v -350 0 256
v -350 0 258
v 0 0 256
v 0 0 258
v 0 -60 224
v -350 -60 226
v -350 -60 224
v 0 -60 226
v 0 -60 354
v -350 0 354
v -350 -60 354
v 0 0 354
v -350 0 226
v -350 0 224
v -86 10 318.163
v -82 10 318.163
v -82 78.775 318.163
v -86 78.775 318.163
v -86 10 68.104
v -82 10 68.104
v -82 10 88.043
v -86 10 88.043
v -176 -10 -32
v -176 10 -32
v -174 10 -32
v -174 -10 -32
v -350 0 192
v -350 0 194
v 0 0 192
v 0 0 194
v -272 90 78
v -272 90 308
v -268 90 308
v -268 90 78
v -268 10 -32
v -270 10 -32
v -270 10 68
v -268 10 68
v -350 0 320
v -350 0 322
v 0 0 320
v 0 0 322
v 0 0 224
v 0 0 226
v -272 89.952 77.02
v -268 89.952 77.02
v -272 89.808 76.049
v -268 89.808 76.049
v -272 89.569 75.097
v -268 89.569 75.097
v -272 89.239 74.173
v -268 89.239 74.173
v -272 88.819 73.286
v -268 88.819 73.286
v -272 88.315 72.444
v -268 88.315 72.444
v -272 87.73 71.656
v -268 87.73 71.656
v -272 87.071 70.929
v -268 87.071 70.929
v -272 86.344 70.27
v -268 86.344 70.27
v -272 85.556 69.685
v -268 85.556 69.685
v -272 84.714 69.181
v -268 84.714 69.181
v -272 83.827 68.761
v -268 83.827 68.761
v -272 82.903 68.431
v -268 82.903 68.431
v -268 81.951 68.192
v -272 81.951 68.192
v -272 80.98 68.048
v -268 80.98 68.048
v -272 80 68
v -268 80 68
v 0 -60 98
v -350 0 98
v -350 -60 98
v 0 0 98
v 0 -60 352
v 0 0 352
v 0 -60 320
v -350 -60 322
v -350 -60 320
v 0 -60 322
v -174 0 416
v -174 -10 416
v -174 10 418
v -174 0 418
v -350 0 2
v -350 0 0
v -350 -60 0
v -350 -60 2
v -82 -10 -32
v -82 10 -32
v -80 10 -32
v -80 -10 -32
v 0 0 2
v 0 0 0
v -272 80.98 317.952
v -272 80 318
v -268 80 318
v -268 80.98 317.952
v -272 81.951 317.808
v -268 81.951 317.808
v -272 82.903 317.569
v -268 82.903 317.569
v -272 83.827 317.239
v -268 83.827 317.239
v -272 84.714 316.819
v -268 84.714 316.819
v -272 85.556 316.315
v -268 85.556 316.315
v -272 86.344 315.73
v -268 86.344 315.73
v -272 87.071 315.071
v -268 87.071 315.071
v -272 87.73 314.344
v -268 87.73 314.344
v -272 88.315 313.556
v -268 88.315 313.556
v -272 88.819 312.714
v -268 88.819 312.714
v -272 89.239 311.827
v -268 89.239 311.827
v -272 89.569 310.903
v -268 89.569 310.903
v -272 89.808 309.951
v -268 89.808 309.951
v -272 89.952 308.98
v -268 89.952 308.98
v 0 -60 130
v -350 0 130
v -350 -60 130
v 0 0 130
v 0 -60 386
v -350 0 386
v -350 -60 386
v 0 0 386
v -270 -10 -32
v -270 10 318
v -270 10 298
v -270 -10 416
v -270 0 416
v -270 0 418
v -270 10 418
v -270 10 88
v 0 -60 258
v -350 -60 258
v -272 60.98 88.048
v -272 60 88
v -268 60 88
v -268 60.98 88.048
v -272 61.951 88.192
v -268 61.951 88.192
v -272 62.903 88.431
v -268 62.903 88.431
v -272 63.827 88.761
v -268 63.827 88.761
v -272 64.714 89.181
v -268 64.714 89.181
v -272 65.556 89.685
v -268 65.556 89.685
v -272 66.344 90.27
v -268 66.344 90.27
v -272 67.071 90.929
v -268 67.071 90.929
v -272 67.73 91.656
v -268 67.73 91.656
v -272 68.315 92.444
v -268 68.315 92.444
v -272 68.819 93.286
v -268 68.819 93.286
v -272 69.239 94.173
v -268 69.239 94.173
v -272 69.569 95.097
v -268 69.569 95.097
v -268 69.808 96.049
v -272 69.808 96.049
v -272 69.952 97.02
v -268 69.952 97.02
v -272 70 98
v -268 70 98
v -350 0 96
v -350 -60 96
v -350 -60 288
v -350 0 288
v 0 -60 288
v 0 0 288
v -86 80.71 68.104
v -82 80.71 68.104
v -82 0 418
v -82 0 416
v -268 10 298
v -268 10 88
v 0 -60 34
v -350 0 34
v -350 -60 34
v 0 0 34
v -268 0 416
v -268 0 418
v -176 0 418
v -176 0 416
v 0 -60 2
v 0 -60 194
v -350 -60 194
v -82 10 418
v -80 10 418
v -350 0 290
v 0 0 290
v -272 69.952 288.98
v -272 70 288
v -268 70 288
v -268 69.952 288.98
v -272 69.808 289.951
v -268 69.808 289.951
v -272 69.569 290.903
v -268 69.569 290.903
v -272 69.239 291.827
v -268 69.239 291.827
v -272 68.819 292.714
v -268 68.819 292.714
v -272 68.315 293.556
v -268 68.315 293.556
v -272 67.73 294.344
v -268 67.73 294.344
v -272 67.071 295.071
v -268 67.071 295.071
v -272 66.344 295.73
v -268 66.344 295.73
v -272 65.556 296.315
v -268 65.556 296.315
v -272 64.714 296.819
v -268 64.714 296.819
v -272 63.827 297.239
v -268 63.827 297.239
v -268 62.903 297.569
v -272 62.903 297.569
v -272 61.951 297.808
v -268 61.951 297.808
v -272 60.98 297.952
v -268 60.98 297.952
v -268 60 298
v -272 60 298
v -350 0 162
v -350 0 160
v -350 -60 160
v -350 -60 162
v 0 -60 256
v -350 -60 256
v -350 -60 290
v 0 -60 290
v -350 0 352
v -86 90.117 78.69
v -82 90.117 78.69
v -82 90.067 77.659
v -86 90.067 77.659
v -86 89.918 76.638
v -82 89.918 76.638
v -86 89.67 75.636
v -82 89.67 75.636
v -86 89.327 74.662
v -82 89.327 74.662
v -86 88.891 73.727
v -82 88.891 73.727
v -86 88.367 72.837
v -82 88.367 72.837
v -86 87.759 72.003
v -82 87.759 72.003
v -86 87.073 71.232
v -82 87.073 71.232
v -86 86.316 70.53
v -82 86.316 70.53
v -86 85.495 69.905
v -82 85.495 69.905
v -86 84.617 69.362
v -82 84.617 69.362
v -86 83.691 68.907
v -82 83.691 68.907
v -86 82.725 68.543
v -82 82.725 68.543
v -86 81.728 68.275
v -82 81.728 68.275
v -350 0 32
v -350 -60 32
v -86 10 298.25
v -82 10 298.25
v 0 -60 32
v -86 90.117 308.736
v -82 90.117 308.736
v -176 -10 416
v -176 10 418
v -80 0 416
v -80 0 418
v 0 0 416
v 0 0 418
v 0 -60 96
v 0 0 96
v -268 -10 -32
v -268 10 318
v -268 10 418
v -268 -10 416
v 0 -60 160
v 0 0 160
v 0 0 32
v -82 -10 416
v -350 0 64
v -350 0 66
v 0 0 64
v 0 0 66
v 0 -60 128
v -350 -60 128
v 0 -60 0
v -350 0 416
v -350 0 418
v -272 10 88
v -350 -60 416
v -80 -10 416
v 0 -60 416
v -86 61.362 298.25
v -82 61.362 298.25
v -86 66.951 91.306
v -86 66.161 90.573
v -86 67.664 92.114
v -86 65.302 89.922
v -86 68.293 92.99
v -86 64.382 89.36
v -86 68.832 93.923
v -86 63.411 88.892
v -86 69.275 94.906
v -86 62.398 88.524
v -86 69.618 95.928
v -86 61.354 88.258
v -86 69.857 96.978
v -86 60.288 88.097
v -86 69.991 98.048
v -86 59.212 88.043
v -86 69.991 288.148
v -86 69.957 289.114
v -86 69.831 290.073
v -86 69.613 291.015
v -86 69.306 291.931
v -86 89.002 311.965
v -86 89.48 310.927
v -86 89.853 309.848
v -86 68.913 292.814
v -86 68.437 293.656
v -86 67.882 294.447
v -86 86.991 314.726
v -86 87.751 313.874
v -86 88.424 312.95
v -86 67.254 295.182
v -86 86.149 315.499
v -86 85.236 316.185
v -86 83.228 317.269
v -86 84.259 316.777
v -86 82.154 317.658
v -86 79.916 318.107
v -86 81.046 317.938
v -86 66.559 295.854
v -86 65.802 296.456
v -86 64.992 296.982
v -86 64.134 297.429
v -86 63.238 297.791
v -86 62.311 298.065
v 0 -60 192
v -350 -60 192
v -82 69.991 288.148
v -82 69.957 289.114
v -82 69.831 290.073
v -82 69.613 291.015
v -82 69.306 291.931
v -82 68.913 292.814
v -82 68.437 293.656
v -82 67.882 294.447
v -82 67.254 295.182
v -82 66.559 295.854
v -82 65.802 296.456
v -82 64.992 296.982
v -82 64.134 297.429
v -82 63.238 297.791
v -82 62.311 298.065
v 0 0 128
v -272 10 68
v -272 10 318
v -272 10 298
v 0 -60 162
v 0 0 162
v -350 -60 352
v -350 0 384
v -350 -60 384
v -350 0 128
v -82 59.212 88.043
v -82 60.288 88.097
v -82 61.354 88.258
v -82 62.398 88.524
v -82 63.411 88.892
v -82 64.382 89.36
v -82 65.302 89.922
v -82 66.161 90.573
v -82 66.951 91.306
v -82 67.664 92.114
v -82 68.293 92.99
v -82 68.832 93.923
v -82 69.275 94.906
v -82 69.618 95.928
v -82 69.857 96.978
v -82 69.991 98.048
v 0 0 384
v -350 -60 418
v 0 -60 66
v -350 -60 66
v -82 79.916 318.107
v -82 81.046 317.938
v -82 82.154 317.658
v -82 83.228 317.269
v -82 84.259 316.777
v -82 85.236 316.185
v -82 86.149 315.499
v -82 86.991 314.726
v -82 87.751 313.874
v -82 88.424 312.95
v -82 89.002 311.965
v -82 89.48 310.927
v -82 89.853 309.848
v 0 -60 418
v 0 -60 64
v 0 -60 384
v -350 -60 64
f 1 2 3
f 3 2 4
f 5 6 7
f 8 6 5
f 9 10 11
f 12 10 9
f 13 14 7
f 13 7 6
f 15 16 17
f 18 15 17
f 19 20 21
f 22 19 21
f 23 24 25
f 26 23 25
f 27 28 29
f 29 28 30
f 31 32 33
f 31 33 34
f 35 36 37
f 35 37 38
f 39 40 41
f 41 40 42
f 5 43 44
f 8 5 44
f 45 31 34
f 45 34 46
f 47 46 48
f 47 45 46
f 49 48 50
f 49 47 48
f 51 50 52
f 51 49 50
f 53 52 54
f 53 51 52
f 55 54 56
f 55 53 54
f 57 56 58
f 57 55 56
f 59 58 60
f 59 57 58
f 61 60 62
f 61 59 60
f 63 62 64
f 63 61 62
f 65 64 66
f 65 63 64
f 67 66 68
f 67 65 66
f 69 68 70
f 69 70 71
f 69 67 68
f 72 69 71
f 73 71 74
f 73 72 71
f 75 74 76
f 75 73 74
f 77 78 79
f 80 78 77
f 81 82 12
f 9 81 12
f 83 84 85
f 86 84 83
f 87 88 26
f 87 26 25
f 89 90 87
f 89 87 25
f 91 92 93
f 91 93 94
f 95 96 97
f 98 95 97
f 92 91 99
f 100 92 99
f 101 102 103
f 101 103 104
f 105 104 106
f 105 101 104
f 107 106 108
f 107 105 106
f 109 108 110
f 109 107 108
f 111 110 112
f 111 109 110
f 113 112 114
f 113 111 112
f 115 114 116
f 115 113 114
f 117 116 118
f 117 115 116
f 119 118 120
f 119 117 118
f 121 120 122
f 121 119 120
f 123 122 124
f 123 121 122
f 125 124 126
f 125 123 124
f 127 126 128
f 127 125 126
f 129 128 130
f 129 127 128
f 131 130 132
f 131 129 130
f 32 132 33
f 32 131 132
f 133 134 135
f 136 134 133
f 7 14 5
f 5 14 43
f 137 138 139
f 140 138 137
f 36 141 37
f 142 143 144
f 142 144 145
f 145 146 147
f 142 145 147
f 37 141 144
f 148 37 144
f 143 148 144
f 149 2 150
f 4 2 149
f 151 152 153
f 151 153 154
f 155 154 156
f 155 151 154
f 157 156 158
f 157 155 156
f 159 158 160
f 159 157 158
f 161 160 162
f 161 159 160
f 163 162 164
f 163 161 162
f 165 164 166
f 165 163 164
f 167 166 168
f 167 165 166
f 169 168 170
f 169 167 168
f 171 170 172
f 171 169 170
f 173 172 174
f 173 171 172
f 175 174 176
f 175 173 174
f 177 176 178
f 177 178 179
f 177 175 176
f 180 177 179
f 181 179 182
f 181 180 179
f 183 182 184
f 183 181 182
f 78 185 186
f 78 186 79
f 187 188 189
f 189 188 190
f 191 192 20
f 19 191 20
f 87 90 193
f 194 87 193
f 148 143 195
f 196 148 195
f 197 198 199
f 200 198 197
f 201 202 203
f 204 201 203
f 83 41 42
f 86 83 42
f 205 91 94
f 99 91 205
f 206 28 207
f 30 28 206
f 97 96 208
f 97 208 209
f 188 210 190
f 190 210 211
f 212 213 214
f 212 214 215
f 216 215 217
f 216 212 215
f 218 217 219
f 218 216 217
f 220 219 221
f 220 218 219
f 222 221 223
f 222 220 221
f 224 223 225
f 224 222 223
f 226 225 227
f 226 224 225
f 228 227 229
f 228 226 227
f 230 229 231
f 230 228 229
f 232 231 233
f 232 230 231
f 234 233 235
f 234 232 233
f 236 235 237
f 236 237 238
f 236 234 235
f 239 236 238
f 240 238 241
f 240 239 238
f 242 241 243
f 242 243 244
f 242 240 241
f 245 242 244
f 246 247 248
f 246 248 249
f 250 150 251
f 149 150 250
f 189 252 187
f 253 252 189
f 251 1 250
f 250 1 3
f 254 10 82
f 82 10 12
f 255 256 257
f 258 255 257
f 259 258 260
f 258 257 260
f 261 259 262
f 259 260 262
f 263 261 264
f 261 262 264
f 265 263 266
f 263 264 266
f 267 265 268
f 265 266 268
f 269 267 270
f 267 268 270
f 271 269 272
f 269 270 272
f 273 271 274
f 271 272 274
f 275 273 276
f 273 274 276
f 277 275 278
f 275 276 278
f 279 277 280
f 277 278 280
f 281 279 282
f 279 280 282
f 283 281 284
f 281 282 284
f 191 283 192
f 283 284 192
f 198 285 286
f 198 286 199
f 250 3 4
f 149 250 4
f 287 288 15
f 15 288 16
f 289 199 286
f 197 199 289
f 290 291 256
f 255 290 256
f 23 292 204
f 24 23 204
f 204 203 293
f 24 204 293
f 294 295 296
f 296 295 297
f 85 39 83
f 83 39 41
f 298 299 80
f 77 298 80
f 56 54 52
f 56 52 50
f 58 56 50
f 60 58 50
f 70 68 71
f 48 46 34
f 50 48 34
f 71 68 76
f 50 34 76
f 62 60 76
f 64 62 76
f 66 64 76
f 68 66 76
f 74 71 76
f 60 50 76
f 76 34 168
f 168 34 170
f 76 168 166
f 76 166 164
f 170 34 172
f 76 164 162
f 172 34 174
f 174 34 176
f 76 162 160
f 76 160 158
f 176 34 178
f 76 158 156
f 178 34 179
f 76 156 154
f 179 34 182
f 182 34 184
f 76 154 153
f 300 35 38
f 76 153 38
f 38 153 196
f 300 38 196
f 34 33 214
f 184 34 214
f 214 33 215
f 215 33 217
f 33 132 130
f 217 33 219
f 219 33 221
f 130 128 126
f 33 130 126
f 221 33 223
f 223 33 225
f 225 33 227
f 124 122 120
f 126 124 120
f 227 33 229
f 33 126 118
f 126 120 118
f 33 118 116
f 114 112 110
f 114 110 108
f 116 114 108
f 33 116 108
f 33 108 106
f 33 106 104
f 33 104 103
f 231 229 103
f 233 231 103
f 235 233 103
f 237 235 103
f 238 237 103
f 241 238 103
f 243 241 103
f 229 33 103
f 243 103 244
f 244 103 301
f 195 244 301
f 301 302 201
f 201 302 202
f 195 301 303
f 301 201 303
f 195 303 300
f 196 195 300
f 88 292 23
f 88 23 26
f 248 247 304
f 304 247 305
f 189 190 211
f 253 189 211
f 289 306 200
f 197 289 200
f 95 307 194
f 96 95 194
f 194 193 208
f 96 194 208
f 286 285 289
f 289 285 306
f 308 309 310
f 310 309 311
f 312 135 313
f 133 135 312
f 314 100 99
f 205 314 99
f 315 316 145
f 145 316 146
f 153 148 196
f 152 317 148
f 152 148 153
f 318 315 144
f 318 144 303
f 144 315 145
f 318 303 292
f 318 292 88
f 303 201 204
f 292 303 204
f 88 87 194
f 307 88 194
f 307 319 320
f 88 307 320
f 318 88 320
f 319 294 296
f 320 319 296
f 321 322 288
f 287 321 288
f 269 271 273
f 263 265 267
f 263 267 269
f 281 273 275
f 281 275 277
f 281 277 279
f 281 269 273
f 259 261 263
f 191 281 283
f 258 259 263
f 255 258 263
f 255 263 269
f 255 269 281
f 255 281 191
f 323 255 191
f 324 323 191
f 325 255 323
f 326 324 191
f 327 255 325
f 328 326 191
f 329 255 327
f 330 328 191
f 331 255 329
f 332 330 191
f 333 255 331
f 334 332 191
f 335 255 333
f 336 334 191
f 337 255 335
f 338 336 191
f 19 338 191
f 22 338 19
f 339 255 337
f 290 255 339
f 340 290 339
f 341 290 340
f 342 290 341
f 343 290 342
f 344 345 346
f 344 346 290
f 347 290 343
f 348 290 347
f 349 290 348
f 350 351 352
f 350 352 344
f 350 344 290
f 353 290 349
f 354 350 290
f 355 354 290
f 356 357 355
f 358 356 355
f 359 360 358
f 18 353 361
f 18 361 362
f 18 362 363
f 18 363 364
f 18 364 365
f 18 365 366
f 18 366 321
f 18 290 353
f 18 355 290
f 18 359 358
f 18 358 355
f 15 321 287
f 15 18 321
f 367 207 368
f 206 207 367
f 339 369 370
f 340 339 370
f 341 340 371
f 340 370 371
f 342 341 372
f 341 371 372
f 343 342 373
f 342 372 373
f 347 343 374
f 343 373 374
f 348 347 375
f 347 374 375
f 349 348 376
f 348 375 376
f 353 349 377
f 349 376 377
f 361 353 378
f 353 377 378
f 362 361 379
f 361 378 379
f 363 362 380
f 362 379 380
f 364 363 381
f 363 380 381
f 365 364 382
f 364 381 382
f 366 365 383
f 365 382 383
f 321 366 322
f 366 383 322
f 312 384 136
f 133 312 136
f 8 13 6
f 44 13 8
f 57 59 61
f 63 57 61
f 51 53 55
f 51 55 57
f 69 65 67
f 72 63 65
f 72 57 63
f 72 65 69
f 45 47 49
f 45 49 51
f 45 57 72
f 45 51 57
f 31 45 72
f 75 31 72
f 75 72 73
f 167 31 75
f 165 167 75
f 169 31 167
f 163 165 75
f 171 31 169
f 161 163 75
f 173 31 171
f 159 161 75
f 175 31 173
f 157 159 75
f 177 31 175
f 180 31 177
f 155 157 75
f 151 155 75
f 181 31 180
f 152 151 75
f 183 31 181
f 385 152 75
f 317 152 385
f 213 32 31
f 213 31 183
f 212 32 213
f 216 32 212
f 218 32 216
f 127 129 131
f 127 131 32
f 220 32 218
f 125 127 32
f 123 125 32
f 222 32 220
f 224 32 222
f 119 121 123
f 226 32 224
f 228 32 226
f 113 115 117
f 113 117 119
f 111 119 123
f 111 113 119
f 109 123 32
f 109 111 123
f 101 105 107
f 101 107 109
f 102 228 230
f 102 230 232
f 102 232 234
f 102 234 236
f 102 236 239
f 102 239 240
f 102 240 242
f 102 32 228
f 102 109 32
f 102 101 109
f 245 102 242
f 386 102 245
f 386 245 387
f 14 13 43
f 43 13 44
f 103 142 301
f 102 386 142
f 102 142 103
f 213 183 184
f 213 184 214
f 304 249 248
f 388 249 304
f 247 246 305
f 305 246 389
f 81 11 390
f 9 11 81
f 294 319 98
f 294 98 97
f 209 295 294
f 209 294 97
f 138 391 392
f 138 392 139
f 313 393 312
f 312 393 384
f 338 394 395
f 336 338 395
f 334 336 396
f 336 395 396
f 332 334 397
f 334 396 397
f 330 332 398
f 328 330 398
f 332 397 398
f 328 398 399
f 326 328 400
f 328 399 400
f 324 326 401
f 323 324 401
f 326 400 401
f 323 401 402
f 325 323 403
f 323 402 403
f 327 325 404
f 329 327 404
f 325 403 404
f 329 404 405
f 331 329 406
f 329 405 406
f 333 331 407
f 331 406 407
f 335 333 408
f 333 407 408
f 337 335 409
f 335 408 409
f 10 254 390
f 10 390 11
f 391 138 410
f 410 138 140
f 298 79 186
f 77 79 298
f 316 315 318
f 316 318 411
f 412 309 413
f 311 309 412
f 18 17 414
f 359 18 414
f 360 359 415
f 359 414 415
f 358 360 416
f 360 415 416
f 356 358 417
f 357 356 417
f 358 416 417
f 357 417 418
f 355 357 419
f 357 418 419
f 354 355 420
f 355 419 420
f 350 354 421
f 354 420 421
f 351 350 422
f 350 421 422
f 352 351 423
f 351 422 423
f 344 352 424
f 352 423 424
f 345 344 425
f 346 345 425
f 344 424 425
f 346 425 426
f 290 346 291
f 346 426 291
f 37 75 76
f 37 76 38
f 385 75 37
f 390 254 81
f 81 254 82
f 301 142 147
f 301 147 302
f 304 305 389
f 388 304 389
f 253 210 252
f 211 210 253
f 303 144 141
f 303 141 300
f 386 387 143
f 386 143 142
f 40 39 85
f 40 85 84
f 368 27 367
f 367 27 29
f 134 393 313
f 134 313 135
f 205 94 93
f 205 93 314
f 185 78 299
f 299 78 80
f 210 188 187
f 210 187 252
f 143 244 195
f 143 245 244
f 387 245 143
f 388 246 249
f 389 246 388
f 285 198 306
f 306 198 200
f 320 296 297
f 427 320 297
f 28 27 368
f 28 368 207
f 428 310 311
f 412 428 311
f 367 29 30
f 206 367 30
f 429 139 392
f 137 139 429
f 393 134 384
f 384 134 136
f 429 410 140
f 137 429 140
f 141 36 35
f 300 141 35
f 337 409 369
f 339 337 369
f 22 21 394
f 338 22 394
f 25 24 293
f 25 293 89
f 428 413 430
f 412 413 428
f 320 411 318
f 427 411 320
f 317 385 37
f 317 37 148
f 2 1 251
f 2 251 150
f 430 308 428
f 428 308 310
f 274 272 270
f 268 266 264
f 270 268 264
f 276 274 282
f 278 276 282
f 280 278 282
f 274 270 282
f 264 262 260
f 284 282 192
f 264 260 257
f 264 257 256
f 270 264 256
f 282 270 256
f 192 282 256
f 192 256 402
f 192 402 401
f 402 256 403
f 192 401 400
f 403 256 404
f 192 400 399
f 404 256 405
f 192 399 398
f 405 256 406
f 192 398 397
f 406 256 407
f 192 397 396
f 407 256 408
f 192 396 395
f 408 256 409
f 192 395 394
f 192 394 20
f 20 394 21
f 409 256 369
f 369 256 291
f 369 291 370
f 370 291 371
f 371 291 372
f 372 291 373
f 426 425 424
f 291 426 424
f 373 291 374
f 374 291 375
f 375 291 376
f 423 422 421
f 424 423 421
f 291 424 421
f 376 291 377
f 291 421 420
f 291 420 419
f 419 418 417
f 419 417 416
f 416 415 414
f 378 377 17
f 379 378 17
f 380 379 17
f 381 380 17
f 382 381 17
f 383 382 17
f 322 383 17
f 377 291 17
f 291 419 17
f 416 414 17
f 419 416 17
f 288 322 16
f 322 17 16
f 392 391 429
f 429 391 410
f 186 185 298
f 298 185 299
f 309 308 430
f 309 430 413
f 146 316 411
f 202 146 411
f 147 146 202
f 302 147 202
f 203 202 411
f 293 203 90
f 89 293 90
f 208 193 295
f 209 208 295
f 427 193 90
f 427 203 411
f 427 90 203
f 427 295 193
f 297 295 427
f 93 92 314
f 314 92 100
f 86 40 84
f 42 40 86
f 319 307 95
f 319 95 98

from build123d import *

# Parameters (mm, degrees)
F0_W     = 350
F0_H     = 2
F1_DEPTH = 60
F2_W     = 2
F2_H     = 20
F3_DEPTH = 450
F6_DEPTH = 2
F8_DEPTH = 4


with BuildPart() as f1:
    # F0 (on Front) → F1 (new body)
    with BuildSketch(Plane.XZ):
        with Locations((-175, 417)):
            Rectangle(F0_W, F0_H)
    extrude(amount=F1_DEPTH)

    # F2 (on face) → F3 (join)
    with BuildSketch(Plane.XY.offset(418)):
        with Locations((-269, 0)):
            Rectangle(F2_W, F2_H)
        with Locations((-81, 0)):
            Rectangle(F2_W, F2_H)
        with Locations((-175, 0)):
            Rectangle(F2_W, F2_H)
    extrude(amount=-F3_DEPTH)

    # F5 (on face) → F6 (join, symmetric)
    with BuildSketch(Plane(origin=(-270, 0, 0), x_dir=(0, -1, 0), z_dir=(-1, 0, 0))):
        with BuildLine():
            Line((-10, 318), (-70, 318))
            Line((-70, 318), (-80, 318))
            ThreePointArc((-80, 318), (-87.0710678119, 315.0710678119), (-90, 308))
            Line((-90, 308), (-90, 78))
            ThreePointArc((-90, 78), (-87.0710678119, 70.9289321881), (-80, 68))
            Line((-80, 68), (-70, 68))
            Line((-70, 68), (-10, 68))
            Line((-10, 68), (-10, 88))
            Line((-10, 88), (-60, 88))
            ThreePointArc((-60, 88), (-67.0710678119, 90.9289321881), (-70, 98))
            Line((-70, 98), (-70, 288))
            ThreePointArc((-70, 288), (-67.0710678119, 295.0710678119), (-60, 298))
            Line((-60, 298), (-10, 298))
            Line((-10, 298), (-10, 318))
        make_face()
    extrude(amount=F6_DEPTH, both=True)


with BuildPart() as f1b:
    # F0 (on Front) → F1, piece 2 (new body)
    with BuildSketch(Plane.XZ):
        with Locations((-175, 385)):
            Rectangle(F0_W, F0_H)
    extrude(amount=F1_DEPTH)


with BuildPart() as f1c:
    # F0 (on Front) → F1, piece 3 (new body)
    with BuildSketch(Plane.XZ):
        with Locations((-175, 353)):
            Rectangle(F0_W, F0_H)
    extrude(amount=F1_DEPTH)


with BuildPart() as f1d:
    # F0 (on Front) → F1, piece 4 (new body)
    with BuildSketch(Plane.XZ):
        with Locations((-175, 321)):
            Rectangle(F0_W, F0_H)
    extrude(amount=F1_DEPTH)


with BuildPart() as f1e:
    # F0 (on Front) → F1, piece 5 (new body)
    with BuildSketch(Plane.XZ):
        with Locations((-175, 289)):
            Rectangle(F0_W, F0_H)
    extrude(amount=F1_DEPTH)


with BuildPart() as f1f:
    # F0 (on Front) → F1, piece 6 (new body)
    with BuildSketch(Plane.XZ):
        with Locations((-175, 257)):
            Rectangle(F0_W, F0_H)
    extrude(amount=F1_DEPTH)


with BuildPart() as f1g:
    # F0 (on Front) → F1, piece 7 (new body)
    with BuildSketch(Plane.XZ):
        with Locations((-175, 225)):
            Rectangle(F0_W, F0_H)
    extrude(amount=F1_DEPTH)


with BuildPart() as f1h:
    # F0 (on Front) → F1, piece 8 (new body)
    with BuildSketch(Plane.XZ):
        with Locations((-175, 193)):
            Rectangle(F0_W, F0_H)
    extrude(amount=F1_DEPTH)


with BuildPart() as f1i:
    # F0 (on Front) → F1, piece 9 (new body)
    with BuildSketch(Plane.XZ):
        with Locations((-175, 161)):
            Rectangle(F0_W, F0_H)
    extrude(amount=F1_DEPTH)


with BuildPart() as f1j:
    # F0 (on Front) → F1, piece 10 (new body)
    with BuildSketch(Plane.XZ):
        with Locations((-175, 129)):
            Rectangle(F0_W, F0_H)
    extrude(amount=F1_DEPTH)


with BuildPart() as f1k:
    # F0 (on Front) → F1, piece 11 (new body)
    with BuildSketch(Plane.XZ):
        with Locations((-175, 97)):
            Rectangle(F0_W, F0_H)
    extrude(amount=F1_DEPTH)


with BuildPart() as f1l:
    # F0 (on Front) → F1, piece 12 (new body)
    with BuildSketch(Plane.XZ):
        with Locations((-175, 65)):
            Rectangle(F0_W, F0_H)
    extrude(amount=F1_DEPTH)


with BuildPart() as f1m:
    # F0 (on Front) → F1, piece 13 (new body)
    with BuildSketch(Plane.XZ):
        with Locations((-175, 33)):
            Rectangle(F0_W, F0_H)
    extrude(amount=F1_DEPTH)


with BuildPart() as f1n:
    # F0 (on Front) → F1, piece 14 (new body)
    with BuildSketch(Plane.XZ):
        with Locations((-175, 1)):
            Rectangle(F0_W, F0_H)
    extrude(amount=F1_DEPTH)


with BuildPart() as f8:
    # F7 (on face) → F8 (new body)
    with BuildSketch(Plane(origin=(-82, 0, 0), x_dir=(0, -1, 0), z_dir=(-1, 0, 0))):
        with BuildLine():
            Line((-10, 298.2498407364), (-10, 318.1632757187))
            Line((-10, 318.1632757187), (-78.7753984332, 318.1632757187))
            ThreePointArc((-78.7753984332, 318.1632757187), (-86.1493487568, 315.4987990699), (-90.1169553399, 308.736205101))
            Line((-90.1169553399, 308.736205101), (-90.1169553399, 78.6898061633))
            ThreePointArc((-90.1169553399, 78.6898061633), (-87.4254689451, 71.609182036), (-80.7102024555, 68.1042522192))
            Line((-80.7102024555, 68.1042522192), (-10, 68.1042522192))
            Line((-10, 68.1042522192), (-10, 88.0431681871))
            Line((-10, 88.0431681871), (-59.2116527259, 88.0431681871))
            ThreePointArc((-59.2116527259, 88.0431681871), (-66.5650380478, 90.9297800306), (-69.9910148978, 98.0478897691))
            Line((-69.9910148978, 98.0478897691), (-69.9910148978, 288.1482243538))
            ThreePointArc((-69.9910148978, 288.1482243538), (-67.5769986798, 294.8224551486), (-61.3620281219, 298.2498407364))
            Line((-61.3620281219, 298.2498407364), (-10, 298.2498407364))
        make_face()
    extrude(amount=F8_DEPTH)


solid = Compound([f1.part, f1b.part, f1c.part, f1d.part, f1e.part, f1f.part, f1g.part, f1h.part, f1i.part, f1j.part, f1k.part, f1l.part, f1m.part, f1n.part, f8.part])
